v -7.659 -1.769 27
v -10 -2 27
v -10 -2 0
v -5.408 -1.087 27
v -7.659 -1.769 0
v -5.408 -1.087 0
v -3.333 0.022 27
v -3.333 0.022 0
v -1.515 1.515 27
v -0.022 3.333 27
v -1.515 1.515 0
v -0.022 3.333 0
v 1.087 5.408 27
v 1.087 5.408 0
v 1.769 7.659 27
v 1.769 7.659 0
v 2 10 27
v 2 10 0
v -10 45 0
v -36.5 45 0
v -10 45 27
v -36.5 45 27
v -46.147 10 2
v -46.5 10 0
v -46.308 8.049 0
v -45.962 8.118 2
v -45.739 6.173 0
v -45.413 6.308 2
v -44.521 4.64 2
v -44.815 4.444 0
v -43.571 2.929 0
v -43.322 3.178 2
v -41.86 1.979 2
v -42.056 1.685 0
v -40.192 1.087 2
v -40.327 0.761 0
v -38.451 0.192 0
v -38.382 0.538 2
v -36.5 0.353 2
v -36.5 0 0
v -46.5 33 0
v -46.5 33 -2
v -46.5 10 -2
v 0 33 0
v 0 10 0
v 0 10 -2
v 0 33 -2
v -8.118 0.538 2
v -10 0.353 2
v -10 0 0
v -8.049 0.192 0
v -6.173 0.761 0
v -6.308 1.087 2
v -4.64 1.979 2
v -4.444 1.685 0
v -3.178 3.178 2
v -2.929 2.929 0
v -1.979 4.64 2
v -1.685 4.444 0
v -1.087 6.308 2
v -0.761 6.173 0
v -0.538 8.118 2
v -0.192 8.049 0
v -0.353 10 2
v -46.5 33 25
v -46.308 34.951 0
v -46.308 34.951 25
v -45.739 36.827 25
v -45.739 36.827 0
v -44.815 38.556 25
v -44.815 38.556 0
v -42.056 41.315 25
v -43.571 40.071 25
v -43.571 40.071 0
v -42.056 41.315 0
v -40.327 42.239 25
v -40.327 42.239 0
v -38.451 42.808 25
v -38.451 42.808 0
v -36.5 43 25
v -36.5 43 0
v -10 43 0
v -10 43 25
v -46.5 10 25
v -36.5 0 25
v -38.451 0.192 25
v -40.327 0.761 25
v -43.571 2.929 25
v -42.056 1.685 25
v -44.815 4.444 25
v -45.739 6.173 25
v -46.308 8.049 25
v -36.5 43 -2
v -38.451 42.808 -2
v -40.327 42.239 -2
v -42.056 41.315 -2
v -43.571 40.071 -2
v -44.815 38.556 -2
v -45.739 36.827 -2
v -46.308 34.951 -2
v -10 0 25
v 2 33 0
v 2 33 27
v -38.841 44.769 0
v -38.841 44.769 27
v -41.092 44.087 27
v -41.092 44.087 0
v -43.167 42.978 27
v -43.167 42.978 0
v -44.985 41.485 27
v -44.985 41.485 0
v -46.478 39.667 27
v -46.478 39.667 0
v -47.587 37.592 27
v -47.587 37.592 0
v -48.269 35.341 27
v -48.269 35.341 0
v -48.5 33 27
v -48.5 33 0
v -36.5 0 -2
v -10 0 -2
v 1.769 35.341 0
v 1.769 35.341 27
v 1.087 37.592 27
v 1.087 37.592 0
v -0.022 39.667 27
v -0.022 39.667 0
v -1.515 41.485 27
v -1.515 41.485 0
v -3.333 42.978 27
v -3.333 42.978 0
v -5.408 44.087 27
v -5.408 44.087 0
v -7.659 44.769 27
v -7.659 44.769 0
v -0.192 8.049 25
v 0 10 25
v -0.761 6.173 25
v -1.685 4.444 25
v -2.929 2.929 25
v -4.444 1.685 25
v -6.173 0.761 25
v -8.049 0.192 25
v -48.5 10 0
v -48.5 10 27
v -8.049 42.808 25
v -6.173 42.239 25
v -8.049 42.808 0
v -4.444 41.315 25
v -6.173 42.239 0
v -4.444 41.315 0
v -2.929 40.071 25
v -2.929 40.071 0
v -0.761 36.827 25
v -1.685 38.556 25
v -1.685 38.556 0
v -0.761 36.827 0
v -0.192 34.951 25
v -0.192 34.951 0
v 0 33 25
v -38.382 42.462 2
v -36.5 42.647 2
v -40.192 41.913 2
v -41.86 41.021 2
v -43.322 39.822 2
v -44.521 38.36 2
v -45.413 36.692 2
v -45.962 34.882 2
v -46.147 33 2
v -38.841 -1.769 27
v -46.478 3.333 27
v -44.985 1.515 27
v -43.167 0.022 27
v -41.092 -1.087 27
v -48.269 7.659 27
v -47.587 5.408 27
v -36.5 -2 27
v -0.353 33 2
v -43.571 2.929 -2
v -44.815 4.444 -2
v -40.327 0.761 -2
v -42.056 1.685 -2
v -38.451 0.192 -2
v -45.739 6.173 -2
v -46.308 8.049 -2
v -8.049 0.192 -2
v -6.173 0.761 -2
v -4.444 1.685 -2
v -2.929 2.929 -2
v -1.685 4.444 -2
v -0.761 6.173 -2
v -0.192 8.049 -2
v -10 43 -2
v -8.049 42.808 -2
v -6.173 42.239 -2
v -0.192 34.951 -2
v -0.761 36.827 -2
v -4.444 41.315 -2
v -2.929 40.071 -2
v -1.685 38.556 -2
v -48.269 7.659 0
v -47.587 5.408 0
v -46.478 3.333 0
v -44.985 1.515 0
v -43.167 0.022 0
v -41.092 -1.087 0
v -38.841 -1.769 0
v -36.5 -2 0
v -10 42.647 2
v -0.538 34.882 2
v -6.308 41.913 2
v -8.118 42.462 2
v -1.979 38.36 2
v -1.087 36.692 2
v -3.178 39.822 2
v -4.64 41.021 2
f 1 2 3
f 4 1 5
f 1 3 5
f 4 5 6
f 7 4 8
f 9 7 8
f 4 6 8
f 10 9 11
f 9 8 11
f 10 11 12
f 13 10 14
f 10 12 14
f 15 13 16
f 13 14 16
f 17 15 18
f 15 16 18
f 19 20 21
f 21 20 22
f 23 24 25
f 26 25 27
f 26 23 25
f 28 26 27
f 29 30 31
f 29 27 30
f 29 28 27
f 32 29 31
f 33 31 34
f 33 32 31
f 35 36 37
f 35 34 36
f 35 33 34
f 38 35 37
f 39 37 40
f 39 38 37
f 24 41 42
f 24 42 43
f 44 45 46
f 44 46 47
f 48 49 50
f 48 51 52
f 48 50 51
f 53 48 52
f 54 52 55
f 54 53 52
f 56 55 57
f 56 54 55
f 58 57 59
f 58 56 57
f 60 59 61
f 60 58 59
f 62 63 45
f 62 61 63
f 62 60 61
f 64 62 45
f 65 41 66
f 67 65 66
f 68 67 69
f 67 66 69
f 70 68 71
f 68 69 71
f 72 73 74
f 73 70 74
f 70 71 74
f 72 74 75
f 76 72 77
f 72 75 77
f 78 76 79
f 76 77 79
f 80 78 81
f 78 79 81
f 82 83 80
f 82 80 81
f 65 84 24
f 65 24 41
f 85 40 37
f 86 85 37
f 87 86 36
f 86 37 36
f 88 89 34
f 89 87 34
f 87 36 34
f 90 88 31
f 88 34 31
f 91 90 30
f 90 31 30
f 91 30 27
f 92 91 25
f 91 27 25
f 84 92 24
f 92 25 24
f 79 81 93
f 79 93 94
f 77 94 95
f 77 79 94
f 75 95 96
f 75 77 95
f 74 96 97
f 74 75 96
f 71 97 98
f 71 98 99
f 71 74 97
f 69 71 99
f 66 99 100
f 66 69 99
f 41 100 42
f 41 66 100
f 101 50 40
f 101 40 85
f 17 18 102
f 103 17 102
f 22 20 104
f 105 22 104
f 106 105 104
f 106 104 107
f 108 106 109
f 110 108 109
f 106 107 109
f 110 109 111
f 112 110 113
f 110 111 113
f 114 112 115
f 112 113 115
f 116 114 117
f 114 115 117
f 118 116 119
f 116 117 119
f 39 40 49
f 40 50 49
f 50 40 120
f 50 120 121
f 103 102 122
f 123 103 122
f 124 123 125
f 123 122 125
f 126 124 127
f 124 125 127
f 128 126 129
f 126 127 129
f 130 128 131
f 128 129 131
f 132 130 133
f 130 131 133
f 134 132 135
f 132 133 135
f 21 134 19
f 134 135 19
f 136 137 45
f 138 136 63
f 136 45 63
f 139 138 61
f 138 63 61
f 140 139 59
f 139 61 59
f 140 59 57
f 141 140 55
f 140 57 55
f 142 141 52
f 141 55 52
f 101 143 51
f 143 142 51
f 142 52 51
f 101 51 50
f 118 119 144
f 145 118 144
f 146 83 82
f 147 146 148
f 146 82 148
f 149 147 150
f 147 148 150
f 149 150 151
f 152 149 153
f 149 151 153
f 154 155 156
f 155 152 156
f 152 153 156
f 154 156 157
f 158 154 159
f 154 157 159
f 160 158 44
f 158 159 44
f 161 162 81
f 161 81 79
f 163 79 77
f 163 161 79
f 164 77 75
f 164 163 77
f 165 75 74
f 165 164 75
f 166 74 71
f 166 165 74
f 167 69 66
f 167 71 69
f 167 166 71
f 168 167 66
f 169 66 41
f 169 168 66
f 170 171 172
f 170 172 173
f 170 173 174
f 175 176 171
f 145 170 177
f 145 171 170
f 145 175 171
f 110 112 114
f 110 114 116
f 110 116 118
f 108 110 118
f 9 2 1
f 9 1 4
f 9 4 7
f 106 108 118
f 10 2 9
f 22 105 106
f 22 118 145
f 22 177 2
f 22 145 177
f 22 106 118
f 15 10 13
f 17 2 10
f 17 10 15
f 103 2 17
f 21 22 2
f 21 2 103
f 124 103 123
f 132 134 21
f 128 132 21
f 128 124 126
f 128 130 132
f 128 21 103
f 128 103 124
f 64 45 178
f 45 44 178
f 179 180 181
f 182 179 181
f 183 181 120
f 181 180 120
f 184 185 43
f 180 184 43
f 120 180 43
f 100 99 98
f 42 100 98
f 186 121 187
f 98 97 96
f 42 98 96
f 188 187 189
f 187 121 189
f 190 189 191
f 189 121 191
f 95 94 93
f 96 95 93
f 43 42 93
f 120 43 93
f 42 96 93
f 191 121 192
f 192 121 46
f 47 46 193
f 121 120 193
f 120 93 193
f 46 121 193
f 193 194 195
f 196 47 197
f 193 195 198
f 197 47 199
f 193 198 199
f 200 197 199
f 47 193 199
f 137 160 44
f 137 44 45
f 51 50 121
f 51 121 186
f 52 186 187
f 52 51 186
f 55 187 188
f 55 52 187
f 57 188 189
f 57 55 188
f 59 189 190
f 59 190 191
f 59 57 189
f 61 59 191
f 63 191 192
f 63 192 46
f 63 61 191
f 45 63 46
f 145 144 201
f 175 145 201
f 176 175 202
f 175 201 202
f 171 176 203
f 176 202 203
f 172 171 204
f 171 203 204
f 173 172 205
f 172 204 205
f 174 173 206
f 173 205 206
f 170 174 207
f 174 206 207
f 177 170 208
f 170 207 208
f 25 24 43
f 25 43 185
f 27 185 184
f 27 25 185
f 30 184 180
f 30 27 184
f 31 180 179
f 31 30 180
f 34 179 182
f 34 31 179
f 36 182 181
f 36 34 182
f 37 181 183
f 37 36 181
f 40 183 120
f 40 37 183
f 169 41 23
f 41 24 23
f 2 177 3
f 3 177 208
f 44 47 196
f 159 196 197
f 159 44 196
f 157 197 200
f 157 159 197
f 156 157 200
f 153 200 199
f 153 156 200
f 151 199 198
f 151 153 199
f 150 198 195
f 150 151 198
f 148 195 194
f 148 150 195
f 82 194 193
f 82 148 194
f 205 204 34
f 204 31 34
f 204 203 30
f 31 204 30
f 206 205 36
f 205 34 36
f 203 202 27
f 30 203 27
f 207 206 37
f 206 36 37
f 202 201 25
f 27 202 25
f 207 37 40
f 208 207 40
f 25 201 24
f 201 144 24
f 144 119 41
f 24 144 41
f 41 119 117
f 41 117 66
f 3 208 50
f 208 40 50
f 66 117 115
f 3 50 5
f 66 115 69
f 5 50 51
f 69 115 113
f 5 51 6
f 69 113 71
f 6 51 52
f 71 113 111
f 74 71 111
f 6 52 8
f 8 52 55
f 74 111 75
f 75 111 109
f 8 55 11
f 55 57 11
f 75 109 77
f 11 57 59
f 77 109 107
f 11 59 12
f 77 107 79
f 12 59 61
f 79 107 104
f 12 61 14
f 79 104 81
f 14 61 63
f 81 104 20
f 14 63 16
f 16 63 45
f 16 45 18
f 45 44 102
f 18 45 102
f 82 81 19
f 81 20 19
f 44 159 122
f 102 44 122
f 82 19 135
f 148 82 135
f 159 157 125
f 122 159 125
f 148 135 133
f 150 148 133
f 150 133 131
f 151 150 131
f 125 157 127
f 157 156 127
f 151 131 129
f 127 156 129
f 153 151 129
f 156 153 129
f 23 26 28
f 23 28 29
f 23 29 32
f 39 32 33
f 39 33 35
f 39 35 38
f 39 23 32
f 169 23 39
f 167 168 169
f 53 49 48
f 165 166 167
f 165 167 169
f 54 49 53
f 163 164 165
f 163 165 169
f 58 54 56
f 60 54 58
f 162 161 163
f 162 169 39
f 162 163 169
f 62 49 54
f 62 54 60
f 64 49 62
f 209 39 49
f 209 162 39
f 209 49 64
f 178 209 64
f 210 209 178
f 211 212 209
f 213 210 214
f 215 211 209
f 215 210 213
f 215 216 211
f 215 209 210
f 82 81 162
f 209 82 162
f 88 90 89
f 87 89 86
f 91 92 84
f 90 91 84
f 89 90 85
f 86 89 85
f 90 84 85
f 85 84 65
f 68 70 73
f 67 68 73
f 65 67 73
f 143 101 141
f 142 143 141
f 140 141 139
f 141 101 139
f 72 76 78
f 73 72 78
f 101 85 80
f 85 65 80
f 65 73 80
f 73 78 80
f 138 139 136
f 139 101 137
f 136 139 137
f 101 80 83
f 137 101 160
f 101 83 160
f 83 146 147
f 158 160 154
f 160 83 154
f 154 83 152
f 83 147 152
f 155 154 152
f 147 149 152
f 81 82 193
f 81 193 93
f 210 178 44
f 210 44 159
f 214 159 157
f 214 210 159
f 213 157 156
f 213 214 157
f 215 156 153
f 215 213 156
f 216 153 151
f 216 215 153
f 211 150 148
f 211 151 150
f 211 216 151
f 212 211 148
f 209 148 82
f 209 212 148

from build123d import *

# Parameters (mm, degrees)
RESSALTO_EXTRUS_O1_DEPTH           = 25
CASCA1_START                       = -36.5
CASCA1_OUTLINE_W                   = 43
CASCA1_OUTLINE_H                   = 25
CASCA1_DEPTH                       = 26.5
CASCA1_2_DEPTH                     = 26.5
CASCA1_3_DEPTH                     = 25
CASCA1_4_DEPTH                     = 27
CASCA1_START_2                     = 25
CASCA1_5_DEPTH                     = 2
RESSALTO_EXTRUS_O2_DEPTH           = 2
RESSALTO_EXTRUS_O2_OTHER_WAY_DEPTH = 2
RESSALTO_EXTRUS_O2_OTHER_WAY_TAPER = 10


with BuildPart() as part:
    # Esboço1 → Ressalto-extrusão1 (new body)
    with BuildSketch(Plane.XY):
        with BuildLine():
            Line((-10, 0), (-36.5, 0))
            ThreePointArc((-36.5, 0), (-43.571067812, 2.928932188), (-46.5, 10))
            Line((-46.5, 10), (-46.5, 33))
            ThreePointArc((-46.5, 33), (-43.571067812, 40.071067812), (-36.5, 43))
            Line((-36.5, 43), (-10, 43))
            ThreePointArc((-10, 43), (-2.928932188, 40.071067812), (0, 33))
            Line((0, 33), (0, 10))
            ThreePointArc((0, 10), (-2.928932188, 2.928932188), (-10, 0))
        make_face()
    extrude(amount=RESSALTO_EXTRUS_O1_DEPTH)

    # Casca1: read off the stored shape, not the designer's step
    # Casca1 outline → Casca1 (cut)
    with BuildSketch(Plane.YZ.offset(CASCA1_START)):
        with Locations((21.5, 12.5)):
            Rectangle(CASCA1_OUTLINE_W, CASCA1_OUTLINE_H)
    extrude(amount=CASCA1_DEPTH, mode=Mode.SUBTRACT)

    # Casca1 2 outline → Casca1 2 (add)
    with BuildSketch(Plane.YZ.offset(CASCA1_START)):
        Polygon((-2, 27), (-2, 0), (0, 0), (0, 25), (43, 25), (43, 0), (45, 0), (45, 27), align=None)
    extrude(amount=CASCA1_2_DEPTH)

    # Casca1 3 outline → Casca1 3 (cut)
    with BuildSketch(Plane.XY):
        with BuildLine():
            Line((-36.5, 0), (-36.5, 43))
            ThreePointArc((-36.5, 43), (-43.571067812, 40.071067812), (-46.5, 33))
            Line((-46.5, 33), (-46.5, 10))
            ThreePointArc((-46.5, 10), (-43.571067812, 2.928932188), (-36.5, 0))
        make_face()
        with BuildLine():
            Line((-10, 43), (-10, 0))
            ThreePointArc((-10, 0), (-2.928932188, 2.928932188), (0, 10))
            Line((0, 10), (0, 33))
            ThreePointArc((0, 33), (-2.928932188, 40.071067812), (-10, 43))
        make_face()
    extrude(amount=CASCA1_3_DEPTH, mode=Mode.SUBTRACT)

    # Casca1 4 outline → Casca1 4 (add)
    with BuildSketch(Plane.XY):
        with BuildLine():
            ThreePointArc((-36.5, 45), (-44.985281374, 41.485281374), (-48.5, 33))
            Line((-48.5, 33), (-48.5, 10))
            ThreePointArc((-48.5, 10), (-44.985281374, 1.514718626), (-36.5, -2))
            Line((-36.5, -2), (-36.5, 0))
            ThreePointArc((-36.5, 0), (-43.571067812, 2.928932188), (-46.5, 10))
            Line((-46.5, 10), (-46.5, 33))
            ThreePointArc((-46.5, 33), (-43.571067812, 40.071067812), (-36.5, 43))
            Line((-36.5, 43), (-36.5, 45))
        make_face()
        with BuildLine():
            ThreePointArc((-10, -2), (-1.514718626, 1.514718626), (2, 10))
            Line((2, 10), (2, 33))
            ThreePointArc((2, 33), (-1.514718626, 41.485281374), (-10, 45))
            Line((-10, 45), (-10, 43))
            ThreePointArc((-10, 43), (-2.928932188, 40.071067812), (0, 33))
            Line((0, 33), (0, 10))
            ThreePointArc((0, 10), (-2.928932188, 2.928932188), (-10, 0))
            Line((-10, 0), (-10, -2))
        make_face()
    extrude(amount=CASCA1_4_DEPTH)

    # Casca1 5 outline → Casca1 5 (add)
    with BuildSketch(Plane.XY.offset(CASCA1_START_2)):
        with BuildLine():
            Line((-36.5, 0), (-36.5, 43))
            ThreePointArc((-36.5, 43), (-43.571067812, 40.071067812), (-46.5, 33))
            Line((-46.5, 33), (-46.5, 10))
            ThreePointArc((-46.5, 10), (-43.571067812, 2.928932188), (-36.5, 0))
        make_face()
        with BuildLine():
            Line((-10, 43), (-10, 0))
            ThreePointArc((-10, 0), (-2.928932188, 2.928932188), (0, 10))
            Line((0, 10), (0, 33))
            ThreePointArc((0, 33), (-2.928932188, 40.071067812), (-10, 43))
        make_face()
    extrude(amount=CASCA1_5_DEPTH)



with BuildPart() as body_2:
    # Esboço6 → Ressalto-extrusão2 (new body)
    with BuildSketch(Plane.XY):
        with BuildLine():
            ThreePointArc((-10, 0), (-2.928932188, 2.928932188), (0, 10))
            Line((0, 10), (0, 33))
            ThreePointArc((0, 33), (-2.928932188, 40.071067812), (-10, 43))
            Line((-10, 43), (-36.5, 43))
            ThreePointArc((-36.5, 43), (-43.571067812, 40.071067812), (-46.5, 33))
            Line((-46.5, 33), (-46.5, 10))
            ThreePointArc((-46.5, 10), (-43.571067812, 2.928932188), (-36.5, 0))
            Line((-36.5, 0), (-10, 0))
        make_face()
    extrude(amount=-RESSALTO_EXTRUS_O2_DEPTH)


with BuildPart() as part_1:
    add(part.part)

    add(body_2.part)  # Ressalto-extrusão2 other way merges body 2
    # Esboço6 → Ressalto-extrusão2 other way (add)
    with BuildSketch(Plane.XY):
        with BuildLine():
            ThreePointArc((-10, 0), (-2.928932188, 2.928932188), (0, 10))
            Line((0, 10), (0, 33))
            ThreePointArc((0, 33), (-2.928932188, 40.071067812), (-10, 43))
            Line((-10, 43), (-36.5, 43))
            ThreePointArc((-36.5, 43), (-43.571067812, 40.071067812), (-46.5, 33))
            Line((-46.5, 33), (-46.5, 10))
            ThreePointArc((-46.5, 10), (-43.571067812, 2.928932188), (-36.5, 0))
            Line((-36.5, 0), (-10, 0))
        make_face()
    extrude(amount=RESSALTO_EXTRUS_O2_OTHER_WAY_DEPTH, taper=RESSALTO_EXTRUS_O2_OTHER_WAY_TAPER)


solid = part_1.part
